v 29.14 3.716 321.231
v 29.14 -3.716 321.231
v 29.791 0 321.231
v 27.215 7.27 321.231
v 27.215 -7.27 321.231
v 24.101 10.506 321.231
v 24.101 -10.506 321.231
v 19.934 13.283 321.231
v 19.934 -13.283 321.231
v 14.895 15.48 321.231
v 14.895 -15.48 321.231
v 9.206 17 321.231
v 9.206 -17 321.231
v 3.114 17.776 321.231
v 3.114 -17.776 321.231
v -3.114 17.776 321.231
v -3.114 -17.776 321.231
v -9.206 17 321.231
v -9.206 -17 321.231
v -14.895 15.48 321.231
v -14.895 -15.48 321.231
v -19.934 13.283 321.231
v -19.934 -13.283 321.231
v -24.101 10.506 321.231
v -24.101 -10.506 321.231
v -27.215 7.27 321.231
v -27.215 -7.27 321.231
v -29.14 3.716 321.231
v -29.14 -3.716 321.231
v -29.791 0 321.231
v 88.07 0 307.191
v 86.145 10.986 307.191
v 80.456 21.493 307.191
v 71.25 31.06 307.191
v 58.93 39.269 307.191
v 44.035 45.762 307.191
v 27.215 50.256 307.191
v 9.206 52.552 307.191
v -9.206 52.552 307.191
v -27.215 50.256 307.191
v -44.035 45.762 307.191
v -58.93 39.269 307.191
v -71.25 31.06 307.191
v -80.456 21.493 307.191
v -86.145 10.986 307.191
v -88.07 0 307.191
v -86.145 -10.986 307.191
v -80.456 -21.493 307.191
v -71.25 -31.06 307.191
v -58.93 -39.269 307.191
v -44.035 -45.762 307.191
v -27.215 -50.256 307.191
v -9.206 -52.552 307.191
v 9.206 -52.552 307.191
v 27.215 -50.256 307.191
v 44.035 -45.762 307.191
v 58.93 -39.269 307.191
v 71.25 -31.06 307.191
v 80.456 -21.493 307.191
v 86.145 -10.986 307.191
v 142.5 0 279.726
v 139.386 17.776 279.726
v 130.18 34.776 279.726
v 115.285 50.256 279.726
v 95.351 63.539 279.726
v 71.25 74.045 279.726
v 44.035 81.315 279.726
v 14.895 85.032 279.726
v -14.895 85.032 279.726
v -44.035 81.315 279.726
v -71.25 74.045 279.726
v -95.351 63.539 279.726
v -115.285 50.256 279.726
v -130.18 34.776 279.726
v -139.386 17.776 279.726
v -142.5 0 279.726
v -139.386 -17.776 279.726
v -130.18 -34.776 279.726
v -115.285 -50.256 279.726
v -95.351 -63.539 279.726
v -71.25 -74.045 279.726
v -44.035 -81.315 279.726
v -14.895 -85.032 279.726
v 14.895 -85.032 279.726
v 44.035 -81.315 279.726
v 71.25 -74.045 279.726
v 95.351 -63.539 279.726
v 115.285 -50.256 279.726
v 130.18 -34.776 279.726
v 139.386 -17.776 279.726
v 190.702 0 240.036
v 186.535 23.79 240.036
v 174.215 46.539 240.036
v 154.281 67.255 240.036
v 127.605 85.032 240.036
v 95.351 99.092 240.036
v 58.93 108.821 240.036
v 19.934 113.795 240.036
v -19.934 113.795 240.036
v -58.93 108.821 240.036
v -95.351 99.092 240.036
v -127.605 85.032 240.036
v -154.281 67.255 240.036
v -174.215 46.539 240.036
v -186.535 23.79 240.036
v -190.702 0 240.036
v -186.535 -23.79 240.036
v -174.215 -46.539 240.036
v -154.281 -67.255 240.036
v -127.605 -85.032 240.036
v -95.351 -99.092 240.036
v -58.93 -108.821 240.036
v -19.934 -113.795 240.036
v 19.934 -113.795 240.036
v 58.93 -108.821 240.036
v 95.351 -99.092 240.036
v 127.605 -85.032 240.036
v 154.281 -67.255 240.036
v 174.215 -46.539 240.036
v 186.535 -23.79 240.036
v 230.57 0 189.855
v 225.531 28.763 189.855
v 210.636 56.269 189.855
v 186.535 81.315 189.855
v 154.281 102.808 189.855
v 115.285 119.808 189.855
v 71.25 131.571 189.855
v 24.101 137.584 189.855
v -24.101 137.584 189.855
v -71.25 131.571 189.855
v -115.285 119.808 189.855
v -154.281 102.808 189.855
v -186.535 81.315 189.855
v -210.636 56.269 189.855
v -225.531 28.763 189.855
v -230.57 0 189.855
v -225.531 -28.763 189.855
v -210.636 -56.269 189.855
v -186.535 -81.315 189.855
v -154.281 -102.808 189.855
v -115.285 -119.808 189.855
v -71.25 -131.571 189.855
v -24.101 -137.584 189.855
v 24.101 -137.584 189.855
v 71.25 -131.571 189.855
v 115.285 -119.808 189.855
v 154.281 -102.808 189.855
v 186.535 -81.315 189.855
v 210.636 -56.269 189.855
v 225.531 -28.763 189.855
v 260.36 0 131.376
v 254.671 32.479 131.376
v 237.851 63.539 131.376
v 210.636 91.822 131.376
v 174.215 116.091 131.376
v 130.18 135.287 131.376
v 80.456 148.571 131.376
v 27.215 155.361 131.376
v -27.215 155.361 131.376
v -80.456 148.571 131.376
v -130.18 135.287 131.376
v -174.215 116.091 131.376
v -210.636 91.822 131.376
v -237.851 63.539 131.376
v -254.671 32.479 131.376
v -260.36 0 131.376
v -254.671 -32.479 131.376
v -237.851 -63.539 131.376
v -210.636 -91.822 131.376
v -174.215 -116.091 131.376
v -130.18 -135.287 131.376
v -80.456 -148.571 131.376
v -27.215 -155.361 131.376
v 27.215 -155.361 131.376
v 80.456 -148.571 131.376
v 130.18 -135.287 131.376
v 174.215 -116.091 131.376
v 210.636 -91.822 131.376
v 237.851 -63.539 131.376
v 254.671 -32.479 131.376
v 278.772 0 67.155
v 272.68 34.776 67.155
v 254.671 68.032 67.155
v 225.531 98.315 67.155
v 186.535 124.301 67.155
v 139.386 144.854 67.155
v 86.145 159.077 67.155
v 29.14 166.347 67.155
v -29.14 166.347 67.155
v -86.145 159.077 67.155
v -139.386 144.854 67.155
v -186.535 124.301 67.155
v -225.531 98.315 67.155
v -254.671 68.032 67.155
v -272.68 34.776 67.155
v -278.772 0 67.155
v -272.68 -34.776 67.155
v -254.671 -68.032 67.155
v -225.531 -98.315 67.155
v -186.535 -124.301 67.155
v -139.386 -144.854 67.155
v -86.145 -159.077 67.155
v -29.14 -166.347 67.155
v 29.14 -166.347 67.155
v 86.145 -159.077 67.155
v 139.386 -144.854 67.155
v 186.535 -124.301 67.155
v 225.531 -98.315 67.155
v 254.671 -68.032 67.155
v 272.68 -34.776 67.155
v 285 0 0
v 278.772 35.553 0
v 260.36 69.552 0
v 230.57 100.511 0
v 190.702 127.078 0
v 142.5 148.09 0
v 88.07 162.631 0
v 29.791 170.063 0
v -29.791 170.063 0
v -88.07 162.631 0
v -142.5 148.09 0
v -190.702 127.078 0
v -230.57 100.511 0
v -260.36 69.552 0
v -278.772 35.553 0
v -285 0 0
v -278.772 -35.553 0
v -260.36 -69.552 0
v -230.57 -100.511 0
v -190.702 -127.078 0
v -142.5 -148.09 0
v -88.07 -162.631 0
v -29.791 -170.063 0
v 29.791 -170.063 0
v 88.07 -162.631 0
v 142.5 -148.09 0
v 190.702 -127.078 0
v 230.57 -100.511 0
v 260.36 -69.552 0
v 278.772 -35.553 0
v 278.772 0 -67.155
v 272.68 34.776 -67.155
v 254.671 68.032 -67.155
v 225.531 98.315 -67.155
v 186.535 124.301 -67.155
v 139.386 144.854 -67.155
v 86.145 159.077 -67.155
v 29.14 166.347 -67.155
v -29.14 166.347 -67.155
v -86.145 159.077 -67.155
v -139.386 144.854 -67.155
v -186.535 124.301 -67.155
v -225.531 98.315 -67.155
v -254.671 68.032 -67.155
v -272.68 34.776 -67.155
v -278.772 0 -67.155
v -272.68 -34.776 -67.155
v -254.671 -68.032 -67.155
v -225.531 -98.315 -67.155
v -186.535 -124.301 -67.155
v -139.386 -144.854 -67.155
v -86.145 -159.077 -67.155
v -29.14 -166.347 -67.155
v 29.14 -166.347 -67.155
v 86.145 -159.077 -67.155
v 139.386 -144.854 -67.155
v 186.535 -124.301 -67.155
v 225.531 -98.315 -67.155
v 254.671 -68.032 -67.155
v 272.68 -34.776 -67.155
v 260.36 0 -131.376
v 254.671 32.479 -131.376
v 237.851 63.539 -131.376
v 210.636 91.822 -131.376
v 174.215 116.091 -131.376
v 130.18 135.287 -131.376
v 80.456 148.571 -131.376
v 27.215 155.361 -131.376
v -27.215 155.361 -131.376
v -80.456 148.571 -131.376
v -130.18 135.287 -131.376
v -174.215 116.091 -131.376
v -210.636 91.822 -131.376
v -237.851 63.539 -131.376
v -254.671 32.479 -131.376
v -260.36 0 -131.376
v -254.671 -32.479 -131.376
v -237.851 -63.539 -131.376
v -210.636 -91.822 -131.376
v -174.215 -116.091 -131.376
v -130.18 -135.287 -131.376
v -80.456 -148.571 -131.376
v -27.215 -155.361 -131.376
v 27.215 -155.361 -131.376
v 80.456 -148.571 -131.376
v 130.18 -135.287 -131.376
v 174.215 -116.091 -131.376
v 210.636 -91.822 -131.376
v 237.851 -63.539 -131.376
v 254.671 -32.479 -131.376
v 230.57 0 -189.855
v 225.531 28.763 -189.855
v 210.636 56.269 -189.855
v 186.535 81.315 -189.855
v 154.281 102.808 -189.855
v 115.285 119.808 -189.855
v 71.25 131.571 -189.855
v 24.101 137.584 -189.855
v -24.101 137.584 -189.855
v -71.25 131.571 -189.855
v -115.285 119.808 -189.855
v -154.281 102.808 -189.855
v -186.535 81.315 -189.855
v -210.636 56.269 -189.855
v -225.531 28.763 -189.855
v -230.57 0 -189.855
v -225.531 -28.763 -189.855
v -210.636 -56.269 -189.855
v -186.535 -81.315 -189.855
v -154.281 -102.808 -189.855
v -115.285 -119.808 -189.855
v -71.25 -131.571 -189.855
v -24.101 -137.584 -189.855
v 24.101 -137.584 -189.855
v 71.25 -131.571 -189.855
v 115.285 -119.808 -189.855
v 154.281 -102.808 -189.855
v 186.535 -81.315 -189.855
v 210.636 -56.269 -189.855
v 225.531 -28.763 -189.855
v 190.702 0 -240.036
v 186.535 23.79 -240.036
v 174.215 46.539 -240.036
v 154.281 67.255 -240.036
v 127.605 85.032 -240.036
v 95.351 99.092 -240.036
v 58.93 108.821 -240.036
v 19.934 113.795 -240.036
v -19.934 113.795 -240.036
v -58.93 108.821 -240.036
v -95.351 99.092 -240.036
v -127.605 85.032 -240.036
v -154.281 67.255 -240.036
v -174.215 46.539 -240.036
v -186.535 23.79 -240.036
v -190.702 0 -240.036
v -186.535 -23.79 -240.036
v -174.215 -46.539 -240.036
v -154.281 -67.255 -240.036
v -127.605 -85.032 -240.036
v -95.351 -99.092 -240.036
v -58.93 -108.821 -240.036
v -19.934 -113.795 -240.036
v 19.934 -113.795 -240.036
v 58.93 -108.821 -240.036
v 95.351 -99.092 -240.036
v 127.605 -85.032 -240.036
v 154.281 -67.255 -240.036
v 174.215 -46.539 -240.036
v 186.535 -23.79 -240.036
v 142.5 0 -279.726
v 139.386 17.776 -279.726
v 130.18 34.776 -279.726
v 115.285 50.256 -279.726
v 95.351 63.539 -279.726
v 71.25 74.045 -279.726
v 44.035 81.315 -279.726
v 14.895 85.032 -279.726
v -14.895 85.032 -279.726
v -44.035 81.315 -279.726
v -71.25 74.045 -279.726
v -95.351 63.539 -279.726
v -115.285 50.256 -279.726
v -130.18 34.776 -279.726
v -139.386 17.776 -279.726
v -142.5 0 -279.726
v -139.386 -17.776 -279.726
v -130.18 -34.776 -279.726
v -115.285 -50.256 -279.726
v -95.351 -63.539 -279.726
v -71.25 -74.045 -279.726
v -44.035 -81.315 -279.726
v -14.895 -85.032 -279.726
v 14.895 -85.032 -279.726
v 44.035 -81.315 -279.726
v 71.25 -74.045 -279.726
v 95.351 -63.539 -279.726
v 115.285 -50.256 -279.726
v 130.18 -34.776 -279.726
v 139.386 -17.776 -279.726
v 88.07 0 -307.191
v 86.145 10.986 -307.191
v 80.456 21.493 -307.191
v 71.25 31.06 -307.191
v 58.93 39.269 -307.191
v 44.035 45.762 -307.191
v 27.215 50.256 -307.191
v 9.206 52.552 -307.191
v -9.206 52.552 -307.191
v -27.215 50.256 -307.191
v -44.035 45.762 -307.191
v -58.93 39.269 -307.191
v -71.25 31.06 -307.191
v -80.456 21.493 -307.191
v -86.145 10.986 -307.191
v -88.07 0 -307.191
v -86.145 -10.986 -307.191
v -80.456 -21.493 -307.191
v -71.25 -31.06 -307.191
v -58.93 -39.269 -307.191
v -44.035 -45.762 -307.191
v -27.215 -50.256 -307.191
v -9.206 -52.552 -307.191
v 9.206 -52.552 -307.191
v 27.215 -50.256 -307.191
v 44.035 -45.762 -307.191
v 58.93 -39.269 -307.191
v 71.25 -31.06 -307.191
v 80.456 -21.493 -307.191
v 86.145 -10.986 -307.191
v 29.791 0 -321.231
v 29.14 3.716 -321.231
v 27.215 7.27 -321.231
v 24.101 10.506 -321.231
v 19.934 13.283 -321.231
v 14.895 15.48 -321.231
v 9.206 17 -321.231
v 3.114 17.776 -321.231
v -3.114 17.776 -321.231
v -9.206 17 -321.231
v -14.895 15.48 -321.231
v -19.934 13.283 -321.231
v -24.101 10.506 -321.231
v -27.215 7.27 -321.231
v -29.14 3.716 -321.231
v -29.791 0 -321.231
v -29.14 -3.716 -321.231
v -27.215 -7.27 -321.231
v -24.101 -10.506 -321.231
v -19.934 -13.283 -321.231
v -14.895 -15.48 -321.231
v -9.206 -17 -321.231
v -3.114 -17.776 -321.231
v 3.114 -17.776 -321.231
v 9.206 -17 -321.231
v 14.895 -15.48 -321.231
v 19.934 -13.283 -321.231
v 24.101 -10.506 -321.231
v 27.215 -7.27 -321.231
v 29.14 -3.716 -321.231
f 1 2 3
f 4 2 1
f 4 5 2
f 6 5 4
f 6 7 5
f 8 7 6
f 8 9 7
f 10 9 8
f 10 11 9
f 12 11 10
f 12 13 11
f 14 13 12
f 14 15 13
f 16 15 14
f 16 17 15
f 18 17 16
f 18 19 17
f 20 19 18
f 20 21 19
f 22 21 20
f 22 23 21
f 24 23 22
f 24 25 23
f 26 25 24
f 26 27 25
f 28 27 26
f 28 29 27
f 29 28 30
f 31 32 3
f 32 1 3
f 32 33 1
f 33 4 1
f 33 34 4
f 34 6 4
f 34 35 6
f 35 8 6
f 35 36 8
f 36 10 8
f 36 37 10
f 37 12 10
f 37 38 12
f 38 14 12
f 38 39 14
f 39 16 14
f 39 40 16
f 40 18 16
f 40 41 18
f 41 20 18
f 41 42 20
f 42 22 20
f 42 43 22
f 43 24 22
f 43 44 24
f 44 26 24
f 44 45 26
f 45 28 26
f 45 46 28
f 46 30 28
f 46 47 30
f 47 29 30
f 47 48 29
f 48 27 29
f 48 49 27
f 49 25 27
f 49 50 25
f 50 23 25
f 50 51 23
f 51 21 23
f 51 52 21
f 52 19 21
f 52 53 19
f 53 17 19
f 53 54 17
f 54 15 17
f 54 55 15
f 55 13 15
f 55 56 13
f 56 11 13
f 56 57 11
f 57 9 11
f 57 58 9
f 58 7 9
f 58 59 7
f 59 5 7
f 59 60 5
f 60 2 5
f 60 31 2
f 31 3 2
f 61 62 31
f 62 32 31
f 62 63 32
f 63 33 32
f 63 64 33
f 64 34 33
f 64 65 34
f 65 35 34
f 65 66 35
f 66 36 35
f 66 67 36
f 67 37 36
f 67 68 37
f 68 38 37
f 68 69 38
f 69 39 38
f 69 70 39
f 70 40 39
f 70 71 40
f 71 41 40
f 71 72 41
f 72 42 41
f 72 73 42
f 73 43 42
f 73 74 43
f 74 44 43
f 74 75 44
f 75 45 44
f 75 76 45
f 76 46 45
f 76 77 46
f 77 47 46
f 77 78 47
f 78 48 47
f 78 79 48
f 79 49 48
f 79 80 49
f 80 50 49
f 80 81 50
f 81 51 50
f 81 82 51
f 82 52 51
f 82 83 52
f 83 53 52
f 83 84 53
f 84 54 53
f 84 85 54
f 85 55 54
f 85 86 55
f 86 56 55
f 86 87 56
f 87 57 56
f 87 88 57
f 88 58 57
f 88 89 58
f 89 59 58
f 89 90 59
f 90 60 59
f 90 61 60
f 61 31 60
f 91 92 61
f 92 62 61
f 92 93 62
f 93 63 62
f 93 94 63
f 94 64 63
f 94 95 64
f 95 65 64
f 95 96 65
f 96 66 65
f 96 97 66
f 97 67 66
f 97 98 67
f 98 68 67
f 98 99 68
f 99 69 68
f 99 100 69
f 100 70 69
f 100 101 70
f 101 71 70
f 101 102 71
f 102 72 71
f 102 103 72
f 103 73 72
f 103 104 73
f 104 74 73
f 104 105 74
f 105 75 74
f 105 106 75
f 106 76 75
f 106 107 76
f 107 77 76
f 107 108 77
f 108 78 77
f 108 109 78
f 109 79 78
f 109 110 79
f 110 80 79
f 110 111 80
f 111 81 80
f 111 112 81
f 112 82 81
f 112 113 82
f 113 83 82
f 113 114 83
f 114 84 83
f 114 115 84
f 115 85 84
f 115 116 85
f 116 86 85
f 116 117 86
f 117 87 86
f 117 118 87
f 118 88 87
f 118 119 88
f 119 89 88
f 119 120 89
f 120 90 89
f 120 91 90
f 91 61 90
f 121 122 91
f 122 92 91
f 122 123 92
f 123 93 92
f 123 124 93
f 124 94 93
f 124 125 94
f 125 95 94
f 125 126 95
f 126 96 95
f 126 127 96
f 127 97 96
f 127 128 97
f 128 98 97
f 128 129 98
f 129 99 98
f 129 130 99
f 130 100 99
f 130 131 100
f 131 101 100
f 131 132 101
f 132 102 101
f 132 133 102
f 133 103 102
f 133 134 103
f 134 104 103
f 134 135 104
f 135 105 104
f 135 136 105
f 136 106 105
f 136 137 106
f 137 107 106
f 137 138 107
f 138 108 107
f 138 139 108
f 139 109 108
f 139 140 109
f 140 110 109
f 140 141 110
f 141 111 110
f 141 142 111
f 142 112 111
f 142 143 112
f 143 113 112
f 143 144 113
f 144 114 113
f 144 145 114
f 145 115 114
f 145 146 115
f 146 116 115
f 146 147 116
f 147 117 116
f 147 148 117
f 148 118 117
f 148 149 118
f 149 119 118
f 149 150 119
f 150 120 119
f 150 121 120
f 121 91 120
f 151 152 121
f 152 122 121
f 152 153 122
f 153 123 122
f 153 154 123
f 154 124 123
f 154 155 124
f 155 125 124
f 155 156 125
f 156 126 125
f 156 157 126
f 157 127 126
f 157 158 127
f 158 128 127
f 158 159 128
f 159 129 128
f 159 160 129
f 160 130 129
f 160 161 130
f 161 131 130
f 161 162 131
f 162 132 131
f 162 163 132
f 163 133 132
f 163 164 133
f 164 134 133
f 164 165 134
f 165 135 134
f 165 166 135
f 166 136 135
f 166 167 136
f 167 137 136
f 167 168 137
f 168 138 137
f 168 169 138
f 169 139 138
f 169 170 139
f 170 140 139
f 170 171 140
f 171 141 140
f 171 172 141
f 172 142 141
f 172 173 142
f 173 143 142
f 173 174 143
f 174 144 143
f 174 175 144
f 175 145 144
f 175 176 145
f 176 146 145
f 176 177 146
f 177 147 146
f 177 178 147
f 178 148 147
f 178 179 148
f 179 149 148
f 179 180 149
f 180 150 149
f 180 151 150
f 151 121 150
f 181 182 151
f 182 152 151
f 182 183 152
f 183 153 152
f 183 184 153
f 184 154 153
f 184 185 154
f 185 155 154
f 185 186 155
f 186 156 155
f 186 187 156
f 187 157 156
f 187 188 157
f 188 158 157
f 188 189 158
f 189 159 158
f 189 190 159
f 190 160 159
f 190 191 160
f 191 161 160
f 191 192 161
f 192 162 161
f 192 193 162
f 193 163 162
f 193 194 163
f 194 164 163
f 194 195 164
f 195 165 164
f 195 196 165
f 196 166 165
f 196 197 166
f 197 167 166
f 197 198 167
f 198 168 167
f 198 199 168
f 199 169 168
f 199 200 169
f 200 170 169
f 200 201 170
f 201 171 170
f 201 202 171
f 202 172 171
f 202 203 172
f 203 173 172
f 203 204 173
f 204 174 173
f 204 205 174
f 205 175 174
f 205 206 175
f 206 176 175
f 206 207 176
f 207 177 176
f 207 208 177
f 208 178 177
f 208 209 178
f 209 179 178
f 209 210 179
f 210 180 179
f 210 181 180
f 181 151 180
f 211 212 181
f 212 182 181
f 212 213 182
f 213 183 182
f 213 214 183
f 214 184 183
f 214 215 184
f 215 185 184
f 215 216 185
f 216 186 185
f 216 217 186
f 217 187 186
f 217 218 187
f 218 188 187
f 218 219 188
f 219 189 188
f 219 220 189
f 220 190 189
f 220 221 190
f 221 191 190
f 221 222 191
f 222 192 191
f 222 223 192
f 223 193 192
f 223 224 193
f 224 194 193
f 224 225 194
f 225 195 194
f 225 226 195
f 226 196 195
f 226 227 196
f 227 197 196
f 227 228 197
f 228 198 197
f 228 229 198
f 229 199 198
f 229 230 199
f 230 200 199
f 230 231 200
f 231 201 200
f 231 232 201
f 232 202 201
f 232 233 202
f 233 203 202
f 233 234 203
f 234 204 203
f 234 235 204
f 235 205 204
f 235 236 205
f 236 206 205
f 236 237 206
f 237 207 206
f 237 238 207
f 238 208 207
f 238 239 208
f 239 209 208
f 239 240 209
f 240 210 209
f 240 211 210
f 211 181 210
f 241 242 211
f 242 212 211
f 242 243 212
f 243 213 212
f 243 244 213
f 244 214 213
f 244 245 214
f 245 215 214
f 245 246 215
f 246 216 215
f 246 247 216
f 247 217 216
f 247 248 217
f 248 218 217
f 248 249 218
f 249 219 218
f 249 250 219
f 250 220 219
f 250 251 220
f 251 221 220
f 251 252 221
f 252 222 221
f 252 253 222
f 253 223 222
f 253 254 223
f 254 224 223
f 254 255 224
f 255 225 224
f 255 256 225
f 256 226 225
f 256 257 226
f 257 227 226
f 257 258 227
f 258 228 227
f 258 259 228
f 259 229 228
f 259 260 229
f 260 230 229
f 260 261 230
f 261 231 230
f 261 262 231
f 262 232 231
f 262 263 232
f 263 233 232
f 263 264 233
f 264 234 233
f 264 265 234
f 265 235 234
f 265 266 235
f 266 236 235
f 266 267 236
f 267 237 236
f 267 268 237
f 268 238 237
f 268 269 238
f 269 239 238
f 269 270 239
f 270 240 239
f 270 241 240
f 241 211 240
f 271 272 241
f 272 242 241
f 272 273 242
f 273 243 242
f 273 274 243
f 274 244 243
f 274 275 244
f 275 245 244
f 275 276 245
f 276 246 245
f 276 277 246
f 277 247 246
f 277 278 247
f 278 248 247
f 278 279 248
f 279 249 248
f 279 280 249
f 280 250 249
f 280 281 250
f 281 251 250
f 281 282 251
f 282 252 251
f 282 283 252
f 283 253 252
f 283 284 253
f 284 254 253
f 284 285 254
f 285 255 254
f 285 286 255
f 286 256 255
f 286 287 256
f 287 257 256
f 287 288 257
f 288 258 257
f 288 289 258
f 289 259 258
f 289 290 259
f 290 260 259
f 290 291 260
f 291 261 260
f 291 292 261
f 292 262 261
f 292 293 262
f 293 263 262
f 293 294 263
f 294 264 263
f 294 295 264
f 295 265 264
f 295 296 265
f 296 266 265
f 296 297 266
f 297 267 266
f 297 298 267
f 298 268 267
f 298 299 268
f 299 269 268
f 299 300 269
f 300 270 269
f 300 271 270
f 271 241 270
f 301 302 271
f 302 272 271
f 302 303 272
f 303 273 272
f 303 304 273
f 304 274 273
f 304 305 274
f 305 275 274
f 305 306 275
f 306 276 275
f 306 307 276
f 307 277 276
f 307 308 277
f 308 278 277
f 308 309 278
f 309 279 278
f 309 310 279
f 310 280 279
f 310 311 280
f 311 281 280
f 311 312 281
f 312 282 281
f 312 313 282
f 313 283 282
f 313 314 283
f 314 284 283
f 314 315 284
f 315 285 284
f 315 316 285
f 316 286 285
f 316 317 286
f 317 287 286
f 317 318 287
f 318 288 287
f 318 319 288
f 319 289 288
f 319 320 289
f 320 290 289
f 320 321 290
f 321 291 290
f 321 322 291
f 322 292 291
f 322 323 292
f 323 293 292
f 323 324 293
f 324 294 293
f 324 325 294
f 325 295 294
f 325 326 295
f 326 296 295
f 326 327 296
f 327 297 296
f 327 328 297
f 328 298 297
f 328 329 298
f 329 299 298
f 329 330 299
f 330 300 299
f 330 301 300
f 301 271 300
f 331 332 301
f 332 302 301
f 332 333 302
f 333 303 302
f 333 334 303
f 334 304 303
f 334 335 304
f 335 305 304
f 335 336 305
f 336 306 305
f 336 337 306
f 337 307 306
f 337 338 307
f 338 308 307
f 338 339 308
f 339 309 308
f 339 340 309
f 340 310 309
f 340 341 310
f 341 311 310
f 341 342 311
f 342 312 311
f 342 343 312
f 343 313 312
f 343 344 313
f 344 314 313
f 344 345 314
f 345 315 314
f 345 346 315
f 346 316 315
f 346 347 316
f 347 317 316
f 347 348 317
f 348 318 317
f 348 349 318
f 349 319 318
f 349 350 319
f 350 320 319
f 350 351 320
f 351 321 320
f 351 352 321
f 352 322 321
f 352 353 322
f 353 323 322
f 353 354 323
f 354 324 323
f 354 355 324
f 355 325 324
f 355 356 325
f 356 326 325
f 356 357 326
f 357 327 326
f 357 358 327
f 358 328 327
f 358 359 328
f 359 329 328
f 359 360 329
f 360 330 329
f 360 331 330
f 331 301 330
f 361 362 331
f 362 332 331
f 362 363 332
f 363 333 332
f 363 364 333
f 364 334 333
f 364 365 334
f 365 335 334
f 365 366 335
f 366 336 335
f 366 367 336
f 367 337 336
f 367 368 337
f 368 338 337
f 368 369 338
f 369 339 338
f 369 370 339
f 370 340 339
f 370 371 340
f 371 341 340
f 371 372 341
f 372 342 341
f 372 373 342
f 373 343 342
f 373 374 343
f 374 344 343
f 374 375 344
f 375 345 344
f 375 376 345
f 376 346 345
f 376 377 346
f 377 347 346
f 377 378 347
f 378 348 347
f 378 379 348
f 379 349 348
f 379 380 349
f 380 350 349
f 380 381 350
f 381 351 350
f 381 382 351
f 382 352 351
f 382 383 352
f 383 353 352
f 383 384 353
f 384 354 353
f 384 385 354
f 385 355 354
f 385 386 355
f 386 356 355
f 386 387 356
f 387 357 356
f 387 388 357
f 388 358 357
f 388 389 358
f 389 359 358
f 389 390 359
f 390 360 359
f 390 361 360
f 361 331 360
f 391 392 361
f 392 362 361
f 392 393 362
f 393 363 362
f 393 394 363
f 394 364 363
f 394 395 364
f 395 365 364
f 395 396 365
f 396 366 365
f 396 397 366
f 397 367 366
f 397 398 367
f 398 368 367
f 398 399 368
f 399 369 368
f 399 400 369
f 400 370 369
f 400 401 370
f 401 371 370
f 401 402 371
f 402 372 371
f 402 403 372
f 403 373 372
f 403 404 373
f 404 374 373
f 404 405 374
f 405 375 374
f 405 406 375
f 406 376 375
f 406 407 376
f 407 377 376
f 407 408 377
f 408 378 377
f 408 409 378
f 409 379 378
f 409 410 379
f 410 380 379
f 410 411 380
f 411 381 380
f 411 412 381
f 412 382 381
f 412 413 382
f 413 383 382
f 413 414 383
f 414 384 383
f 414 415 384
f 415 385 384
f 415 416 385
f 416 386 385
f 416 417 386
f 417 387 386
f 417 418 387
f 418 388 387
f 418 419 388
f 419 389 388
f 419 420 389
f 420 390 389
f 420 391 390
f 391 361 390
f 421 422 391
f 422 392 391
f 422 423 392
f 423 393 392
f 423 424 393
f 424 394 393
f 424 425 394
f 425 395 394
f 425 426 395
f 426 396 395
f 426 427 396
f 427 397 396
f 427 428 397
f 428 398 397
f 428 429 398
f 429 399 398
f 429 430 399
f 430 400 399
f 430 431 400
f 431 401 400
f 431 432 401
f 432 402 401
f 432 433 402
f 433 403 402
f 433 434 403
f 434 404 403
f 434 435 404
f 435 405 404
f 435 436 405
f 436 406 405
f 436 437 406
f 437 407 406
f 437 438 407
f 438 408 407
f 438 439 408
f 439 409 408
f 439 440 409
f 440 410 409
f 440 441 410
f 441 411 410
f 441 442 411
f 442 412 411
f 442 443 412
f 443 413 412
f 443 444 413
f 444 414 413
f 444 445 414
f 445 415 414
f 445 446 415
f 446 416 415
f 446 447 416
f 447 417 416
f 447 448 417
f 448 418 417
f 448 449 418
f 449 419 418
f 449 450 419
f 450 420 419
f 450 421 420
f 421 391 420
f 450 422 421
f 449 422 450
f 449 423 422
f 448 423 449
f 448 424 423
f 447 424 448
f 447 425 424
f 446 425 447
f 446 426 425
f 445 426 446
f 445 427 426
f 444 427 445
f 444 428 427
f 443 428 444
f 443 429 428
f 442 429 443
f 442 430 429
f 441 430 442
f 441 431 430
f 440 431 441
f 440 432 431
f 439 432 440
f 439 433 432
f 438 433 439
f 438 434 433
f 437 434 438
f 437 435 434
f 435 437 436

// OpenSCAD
// Generated by SolidPython 1.0.1 on 2020-07-29 00:46:52


scale(v = [15, 9, 17]) {
	sphere(r = 19);
}
/***********************************************
*********      SolidPython code:      **********
************************************************
 
# import packages: SolidPython
from solid import *
from solid.utils import *
from itertools import chain, combinations, permutations


class Resize:

    def __init__(self, scad_file):
        self.scad_file = scad_file
        #self.scad_file = import_scad(scad_file)
        # cone/cylinder param:
        self.r1 = 0
        self.r2 = 0
        self.h = 0
        # rectangular prism param:
        self.w = 0
        self.l = 0
        # ellipse param:
        self.r = 0

    # import OpenScad code (file name corresponds to shape)


    # classify shape + parameters
    def assign(self, param1, param2, param3):
        if self.scad_file == 'cone.scad':
            self.r1 = param1
            self.r2 = param2
            self.h = param3
        elif self.scad_file == 'cylinder.scad':
            self.r1 = param1
            self.r2 = param2
            self.h = param3
        elif self.scad_file == 'rectangularPrism.scad':
            self.h = param1
            self.l = param2
            self.w = param3
        else:
            self.r = param1
            self.h = param2

    # resize parameters
    def iterate(self):
        x = range(3, 20, 2)
        i = 1
        if self.scad_file == 'cone.scad':
            tempList = list(permutations(x, 2))
            for temp in tempList:
                param1 = temp[0]
                param2 = temp[1]
                filepath = 'produced_scad_files/' + 'cone' + str(param1) + '_' + str(param2) + '_' + '.scad'
                scad_render_to_file(cylinder(h=param1, r1=param2, r2=0), filepath)

        elif self.scad_file == 'cylinder.scad':
            tempList = list(permutations(x, 3))
            for temp in tempList:
                param1 = temp[0]
                param2 = temp[1]
                filepath = 'produced_scad_files/' + 'cylinder' + str(param1) + '_' + str(param2) + '_' + '.scad'
                scad_render_to_file(cylinder(h=param1, r1=param2, r2=param2), filepath)

        elif self.scad_file == 'rectangularPrism.scad':
            tempList = list(permutations(x, 3))
            for temp in tempList:
                param1 = temp[0]
                param2 = temp[1]
                param3 = temp[2]
                filepath = 'produced_scad_files/' + 'rectangularPrism' + str(param1) + '_' + str(param2) + '_' + str(
                    param3) + '.scad'
                scad_render_to_file(cube(size=(param1, param2, param3)), filepath)

        elif self.scad_file == 'ellipse.scad':
            tempList = list(permutations(x, 4))
            for temp in tempList:
                param1 = temp[0]
                param2 = temp[1]
                param3 = temp[2]
                param4 = temp[3]
                filepath = 'produced_scad_files/' + 'ellipse' + str(param1) + '_' + str(param2) + '_' + str(param3) + '_' + str(param4) + '.scad'
                scad_render_to_file(scale([param1, param2, param3])(sphere(r=param4)), filepath)

    def render_to_scadfile(self):
        scad_render_to_file(scad, 'example.scad') 
 
************************************************/
